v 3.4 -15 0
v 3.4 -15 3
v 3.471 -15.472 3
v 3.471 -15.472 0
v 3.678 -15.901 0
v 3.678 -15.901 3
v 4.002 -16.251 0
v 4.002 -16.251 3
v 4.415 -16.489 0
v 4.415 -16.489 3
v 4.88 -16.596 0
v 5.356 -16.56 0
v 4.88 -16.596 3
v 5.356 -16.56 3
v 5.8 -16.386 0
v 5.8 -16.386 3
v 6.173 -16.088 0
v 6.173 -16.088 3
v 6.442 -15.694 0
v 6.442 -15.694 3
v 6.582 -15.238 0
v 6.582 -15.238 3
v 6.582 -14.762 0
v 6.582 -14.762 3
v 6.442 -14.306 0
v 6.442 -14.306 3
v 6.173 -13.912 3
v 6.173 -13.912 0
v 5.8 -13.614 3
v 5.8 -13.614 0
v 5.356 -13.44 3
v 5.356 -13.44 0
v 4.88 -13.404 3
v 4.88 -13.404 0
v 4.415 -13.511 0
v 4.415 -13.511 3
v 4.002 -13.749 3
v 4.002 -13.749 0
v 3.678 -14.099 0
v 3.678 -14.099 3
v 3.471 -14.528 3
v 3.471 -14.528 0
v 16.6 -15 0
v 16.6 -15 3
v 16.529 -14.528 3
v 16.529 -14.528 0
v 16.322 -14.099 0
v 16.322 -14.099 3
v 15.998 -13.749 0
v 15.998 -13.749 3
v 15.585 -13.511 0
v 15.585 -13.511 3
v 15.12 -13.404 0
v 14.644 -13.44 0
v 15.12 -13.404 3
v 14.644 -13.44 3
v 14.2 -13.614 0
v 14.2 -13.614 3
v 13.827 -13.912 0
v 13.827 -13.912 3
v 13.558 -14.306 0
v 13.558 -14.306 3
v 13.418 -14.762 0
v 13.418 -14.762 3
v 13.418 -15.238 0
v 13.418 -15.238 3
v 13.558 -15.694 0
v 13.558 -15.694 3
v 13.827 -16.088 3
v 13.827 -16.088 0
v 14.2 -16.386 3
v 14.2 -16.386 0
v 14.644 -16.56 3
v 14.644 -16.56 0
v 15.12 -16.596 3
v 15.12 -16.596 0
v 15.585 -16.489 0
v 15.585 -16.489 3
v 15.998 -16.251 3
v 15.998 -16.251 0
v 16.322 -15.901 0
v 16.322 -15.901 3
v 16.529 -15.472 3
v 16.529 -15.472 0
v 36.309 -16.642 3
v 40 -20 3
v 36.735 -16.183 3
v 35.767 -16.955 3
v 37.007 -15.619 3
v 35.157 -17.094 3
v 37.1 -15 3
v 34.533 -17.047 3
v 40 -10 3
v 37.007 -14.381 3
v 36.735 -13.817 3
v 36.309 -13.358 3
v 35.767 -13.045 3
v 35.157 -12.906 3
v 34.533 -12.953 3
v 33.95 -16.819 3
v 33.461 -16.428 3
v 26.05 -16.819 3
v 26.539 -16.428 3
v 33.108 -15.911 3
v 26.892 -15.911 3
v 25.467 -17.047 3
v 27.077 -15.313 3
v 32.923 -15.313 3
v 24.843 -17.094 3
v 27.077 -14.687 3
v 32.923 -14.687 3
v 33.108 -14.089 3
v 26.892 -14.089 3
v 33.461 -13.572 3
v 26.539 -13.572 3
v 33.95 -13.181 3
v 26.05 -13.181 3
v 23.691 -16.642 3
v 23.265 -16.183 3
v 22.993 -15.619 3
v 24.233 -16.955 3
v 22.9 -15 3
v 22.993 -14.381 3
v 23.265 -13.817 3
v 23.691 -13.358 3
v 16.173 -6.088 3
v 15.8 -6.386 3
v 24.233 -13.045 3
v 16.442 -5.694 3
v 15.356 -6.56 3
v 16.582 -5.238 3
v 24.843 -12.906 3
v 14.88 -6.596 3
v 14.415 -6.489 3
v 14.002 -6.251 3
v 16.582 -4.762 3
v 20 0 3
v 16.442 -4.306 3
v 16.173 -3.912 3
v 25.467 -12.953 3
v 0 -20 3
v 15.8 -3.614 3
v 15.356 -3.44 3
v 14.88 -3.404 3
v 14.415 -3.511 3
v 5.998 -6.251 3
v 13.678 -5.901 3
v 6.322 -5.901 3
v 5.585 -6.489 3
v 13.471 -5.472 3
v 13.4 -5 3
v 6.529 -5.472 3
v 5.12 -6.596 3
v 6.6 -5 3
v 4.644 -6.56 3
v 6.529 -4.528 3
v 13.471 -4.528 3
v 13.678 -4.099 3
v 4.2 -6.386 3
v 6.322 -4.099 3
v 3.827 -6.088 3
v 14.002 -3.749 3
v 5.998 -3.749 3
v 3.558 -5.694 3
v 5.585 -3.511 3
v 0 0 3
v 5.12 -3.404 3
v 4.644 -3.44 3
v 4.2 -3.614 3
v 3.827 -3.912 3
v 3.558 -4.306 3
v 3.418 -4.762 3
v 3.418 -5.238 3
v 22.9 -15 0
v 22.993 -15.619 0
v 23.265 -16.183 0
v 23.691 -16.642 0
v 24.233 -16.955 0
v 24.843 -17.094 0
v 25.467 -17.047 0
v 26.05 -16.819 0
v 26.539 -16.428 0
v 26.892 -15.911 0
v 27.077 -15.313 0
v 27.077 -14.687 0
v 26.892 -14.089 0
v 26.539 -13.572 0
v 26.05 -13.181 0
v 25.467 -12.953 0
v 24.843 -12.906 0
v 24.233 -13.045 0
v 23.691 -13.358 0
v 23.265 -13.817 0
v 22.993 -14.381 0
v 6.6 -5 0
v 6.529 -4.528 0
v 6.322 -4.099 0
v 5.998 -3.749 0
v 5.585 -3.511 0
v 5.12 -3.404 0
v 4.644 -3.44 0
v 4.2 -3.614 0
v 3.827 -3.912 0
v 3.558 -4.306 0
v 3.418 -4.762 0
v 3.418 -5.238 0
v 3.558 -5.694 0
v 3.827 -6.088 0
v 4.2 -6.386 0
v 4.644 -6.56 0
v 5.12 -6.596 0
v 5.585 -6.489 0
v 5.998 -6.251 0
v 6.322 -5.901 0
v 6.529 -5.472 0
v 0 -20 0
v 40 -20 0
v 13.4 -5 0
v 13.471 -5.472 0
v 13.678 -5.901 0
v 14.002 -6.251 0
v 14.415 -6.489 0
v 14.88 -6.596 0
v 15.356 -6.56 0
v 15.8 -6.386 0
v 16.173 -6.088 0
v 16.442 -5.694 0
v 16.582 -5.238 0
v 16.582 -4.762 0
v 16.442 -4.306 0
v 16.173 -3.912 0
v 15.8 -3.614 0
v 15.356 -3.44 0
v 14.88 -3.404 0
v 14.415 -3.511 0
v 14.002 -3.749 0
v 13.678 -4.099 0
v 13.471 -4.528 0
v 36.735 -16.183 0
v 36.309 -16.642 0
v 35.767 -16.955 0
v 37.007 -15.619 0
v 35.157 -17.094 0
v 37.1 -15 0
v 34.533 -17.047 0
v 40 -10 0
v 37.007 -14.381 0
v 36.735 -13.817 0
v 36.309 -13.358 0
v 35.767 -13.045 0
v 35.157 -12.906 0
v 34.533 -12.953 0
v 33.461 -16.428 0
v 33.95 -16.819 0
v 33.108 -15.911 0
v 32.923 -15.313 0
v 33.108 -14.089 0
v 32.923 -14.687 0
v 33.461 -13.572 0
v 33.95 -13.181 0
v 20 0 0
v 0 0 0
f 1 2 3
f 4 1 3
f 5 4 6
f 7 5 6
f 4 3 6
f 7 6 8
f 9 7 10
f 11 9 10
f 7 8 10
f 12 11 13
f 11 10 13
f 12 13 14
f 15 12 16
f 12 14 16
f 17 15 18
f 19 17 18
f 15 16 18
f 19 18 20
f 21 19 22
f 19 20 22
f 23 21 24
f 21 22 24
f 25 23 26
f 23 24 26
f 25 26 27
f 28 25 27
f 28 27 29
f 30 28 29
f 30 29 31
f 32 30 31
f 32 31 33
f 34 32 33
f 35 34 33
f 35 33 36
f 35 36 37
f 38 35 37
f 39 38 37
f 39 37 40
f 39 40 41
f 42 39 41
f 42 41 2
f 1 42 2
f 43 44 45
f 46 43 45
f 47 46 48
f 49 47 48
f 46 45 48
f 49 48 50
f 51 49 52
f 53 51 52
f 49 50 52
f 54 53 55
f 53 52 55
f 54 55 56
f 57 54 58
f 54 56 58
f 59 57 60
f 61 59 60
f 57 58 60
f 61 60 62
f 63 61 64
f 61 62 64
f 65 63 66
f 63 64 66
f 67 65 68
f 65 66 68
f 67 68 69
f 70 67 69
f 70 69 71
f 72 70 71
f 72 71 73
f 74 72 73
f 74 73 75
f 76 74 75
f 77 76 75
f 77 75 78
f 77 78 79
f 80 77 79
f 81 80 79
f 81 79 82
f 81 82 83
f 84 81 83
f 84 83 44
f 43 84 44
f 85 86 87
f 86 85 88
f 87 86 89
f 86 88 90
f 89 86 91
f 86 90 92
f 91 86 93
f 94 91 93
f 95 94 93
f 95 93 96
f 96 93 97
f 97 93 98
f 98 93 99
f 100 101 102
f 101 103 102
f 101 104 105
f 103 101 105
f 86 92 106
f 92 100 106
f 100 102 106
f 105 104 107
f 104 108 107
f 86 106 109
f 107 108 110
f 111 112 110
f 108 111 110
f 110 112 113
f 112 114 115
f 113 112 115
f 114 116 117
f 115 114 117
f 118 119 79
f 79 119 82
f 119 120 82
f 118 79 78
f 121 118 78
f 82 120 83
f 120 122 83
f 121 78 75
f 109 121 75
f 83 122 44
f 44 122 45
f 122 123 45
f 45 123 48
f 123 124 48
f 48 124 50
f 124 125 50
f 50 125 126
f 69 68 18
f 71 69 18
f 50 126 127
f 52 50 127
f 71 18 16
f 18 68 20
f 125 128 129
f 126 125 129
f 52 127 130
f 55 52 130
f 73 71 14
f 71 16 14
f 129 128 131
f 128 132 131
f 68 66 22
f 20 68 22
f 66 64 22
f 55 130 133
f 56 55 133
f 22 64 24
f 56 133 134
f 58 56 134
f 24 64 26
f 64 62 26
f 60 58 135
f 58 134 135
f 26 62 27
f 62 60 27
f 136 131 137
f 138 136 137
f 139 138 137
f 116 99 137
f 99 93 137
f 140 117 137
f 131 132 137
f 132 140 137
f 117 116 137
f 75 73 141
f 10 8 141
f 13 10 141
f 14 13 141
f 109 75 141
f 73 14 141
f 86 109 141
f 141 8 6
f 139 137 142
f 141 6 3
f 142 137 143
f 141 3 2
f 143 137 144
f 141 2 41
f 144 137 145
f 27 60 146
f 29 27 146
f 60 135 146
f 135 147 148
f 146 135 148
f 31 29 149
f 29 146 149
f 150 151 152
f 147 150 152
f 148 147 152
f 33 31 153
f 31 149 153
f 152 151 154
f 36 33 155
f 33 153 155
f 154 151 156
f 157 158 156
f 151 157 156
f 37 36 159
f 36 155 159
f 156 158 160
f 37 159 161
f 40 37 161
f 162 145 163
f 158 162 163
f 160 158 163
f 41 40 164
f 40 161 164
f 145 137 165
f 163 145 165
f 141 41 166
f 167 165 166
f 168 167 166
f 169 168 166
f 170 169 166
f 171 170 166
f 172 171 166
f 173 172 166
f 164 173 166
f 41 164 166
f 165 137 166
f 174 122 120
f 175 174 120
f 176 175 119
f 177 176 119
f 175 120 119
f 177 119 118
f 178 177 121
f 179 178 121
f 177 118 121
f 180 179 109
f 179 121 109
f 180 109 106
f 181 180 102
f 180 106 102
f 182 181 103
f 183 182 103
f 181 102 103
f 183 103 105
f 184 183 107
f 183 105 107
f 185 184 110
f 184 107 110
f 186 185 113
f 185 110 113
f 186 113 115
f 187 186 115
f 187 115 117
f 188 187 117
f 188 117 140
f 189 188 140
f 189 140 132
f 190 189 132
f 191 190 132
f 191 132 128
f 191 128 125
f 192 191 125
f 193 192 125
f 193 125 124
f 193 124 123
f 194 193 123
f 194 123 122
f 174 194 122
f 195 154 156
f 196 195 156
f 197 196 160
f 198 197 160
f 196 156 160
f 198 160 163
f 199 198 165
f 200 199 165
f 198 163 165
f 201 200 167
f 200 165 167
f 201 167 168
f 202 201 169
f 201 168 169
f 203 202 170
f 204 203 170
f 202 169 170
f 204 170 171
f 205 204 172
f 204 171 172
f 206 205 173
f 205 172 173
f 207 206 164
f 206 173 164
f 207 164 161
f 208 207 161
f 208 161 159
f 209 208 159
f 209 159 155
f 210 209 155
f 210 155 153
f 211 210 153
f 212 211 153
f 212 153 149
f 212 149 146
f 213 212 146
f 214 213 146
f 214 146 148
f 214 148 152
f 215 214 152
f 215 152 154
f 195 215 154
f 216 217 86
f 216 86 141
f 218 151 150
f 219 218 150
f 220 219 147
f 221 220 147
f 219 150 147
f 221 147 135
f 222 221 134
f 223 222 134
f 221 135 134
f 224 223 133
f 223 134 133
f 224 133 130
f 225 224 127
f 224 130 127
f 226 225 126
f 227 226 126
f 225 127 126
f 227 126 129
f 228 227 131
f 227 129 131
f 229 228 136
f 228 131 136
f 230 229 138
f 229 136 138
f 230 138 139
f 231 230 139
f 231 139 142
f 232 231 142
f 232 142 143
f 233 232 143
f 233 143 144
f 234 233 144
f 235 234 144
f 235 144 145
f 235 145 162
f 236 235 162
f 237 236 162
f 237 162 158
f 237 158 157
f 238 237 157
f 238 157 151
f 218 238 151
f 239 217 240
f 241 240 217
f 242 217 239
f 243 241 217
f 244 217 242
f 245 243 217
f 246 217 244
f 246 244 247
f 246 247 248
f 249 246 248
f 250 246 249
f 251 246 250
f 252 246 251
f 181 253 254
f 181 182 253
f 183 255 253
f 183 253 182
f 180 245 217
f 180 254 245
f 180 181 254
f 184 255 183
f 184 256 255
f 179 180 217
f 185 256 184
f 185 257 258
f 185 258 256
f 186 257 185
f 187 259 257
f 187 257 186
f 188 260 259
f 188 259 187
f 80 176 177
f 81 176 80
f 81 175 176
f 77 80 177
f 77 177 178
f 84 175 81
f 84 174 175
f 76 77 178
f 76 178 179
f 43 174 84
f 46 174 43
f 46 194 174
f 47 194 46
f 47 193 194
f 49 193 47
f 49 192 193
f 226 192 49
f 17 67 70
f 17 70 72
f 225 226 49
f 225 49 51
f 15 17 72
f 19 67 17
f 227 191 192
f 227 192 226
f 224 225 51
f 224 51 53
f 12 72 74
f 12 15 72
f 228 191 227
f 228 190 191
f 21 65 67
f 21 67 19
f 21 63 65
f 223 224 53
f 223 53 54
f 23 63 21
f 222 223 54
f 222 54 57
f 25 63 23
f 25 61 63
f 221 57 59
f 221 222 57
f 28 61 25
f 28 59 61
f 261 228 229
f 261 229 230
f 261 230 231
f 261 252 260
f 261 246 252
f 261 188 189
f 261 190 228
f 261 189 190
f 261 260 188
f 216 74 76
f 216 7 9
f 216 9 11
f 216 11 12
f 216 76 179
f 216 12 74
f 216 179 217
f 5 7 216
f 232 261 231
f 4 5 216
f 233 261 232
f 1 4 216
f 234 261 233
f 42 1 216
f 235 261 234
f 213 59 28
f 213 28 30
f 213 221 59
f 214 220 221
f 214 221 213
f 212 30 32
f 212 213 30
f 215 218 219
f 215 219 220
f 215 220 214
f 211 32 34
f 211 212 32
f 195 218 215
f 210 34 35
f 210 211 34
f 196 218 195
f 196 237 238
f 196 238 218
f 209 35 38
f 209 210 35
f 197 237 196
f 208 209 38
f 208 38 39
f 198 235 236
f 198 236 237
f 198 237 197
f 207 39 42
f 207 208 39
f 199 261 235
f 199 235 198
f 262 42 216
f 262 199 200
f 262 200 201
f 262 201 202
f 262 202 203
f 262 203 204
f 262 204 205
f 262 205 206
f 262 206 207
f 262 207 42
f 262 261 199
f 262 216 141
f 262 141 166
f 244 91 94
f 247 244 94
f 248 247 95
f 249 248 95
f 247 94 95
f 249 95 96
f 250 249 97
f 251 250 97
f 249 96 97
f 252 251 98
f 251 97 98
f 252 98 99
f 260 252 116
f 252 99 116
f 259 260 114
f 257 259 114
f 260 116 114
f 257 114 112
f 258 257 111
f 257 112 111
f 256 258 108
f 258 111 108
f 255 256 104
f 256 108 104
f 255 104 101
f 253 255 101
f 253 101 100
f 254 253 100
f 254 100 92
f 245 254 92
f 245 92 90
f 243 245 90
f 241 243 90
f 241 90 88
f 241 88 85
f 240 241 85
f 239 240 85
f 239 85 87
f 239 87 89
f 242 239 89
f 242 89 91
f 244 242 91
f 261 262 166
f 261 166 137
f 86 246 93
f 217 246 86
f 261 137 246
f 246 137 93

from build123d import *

# Parameters (mm, degrees)
EXTRUDE_1_DEPTH     = 3
SKETCH_2_R          = 1.6
SKETCH_2_R_2        = 2.1
CUT_EXTRUDE_1_DEPTH = 45.821869662
EXTRUDE_2_DEPTH     = 3


with BuildPart() as part:
    # 草图1 → 凸台-拉伸1 (new body)
    with BuildSketch(Plane.XY):
        Polygon((0, 0), (20, 0), (20, -10), (40, -10), (40, -20), (0, -20), align=None)
    extrude(amount=EXTRUDE_1_DEPTH)

    # 草图2 → 切除-拉伸1 (cut, through all)
    with BuildSketch(Plane.XY.offset(3)):
        with Locations((5, -5)):
            Circle(SKETCH_2_R)
        with Locations(Location((5, -15, 0), (0, 0, 180))):
            Circle(SKETCH_2_R)
        with Locations(Location((15, -5, 0), (0, 0, 180))):
            Circle(SKETCH_2_R)
        with Locations((15, -15)):
            Circle(SKETCH_2_R)
        with Locations((35, -15)):
            Circle(SKETCH_2_R_2)
        with Locations(Location((25, -15, 0), (0, 0, 180))):
            Circle(SKETCH_2_R_2)
    extrude(amount=-CUT_EXTRUDE_1_DEPTH, mode=Mode.SUBTRACT)

    # 草图4 → 凸台-拉伸2 (add)
    with BuildSketch(Plane.XY.offset(3)):
        Polygon((20, 0), (40, -10), (20, -10), align=None)
    extrude(amount=-EXTRUDE_2_DEPTH)


solid = part.part
